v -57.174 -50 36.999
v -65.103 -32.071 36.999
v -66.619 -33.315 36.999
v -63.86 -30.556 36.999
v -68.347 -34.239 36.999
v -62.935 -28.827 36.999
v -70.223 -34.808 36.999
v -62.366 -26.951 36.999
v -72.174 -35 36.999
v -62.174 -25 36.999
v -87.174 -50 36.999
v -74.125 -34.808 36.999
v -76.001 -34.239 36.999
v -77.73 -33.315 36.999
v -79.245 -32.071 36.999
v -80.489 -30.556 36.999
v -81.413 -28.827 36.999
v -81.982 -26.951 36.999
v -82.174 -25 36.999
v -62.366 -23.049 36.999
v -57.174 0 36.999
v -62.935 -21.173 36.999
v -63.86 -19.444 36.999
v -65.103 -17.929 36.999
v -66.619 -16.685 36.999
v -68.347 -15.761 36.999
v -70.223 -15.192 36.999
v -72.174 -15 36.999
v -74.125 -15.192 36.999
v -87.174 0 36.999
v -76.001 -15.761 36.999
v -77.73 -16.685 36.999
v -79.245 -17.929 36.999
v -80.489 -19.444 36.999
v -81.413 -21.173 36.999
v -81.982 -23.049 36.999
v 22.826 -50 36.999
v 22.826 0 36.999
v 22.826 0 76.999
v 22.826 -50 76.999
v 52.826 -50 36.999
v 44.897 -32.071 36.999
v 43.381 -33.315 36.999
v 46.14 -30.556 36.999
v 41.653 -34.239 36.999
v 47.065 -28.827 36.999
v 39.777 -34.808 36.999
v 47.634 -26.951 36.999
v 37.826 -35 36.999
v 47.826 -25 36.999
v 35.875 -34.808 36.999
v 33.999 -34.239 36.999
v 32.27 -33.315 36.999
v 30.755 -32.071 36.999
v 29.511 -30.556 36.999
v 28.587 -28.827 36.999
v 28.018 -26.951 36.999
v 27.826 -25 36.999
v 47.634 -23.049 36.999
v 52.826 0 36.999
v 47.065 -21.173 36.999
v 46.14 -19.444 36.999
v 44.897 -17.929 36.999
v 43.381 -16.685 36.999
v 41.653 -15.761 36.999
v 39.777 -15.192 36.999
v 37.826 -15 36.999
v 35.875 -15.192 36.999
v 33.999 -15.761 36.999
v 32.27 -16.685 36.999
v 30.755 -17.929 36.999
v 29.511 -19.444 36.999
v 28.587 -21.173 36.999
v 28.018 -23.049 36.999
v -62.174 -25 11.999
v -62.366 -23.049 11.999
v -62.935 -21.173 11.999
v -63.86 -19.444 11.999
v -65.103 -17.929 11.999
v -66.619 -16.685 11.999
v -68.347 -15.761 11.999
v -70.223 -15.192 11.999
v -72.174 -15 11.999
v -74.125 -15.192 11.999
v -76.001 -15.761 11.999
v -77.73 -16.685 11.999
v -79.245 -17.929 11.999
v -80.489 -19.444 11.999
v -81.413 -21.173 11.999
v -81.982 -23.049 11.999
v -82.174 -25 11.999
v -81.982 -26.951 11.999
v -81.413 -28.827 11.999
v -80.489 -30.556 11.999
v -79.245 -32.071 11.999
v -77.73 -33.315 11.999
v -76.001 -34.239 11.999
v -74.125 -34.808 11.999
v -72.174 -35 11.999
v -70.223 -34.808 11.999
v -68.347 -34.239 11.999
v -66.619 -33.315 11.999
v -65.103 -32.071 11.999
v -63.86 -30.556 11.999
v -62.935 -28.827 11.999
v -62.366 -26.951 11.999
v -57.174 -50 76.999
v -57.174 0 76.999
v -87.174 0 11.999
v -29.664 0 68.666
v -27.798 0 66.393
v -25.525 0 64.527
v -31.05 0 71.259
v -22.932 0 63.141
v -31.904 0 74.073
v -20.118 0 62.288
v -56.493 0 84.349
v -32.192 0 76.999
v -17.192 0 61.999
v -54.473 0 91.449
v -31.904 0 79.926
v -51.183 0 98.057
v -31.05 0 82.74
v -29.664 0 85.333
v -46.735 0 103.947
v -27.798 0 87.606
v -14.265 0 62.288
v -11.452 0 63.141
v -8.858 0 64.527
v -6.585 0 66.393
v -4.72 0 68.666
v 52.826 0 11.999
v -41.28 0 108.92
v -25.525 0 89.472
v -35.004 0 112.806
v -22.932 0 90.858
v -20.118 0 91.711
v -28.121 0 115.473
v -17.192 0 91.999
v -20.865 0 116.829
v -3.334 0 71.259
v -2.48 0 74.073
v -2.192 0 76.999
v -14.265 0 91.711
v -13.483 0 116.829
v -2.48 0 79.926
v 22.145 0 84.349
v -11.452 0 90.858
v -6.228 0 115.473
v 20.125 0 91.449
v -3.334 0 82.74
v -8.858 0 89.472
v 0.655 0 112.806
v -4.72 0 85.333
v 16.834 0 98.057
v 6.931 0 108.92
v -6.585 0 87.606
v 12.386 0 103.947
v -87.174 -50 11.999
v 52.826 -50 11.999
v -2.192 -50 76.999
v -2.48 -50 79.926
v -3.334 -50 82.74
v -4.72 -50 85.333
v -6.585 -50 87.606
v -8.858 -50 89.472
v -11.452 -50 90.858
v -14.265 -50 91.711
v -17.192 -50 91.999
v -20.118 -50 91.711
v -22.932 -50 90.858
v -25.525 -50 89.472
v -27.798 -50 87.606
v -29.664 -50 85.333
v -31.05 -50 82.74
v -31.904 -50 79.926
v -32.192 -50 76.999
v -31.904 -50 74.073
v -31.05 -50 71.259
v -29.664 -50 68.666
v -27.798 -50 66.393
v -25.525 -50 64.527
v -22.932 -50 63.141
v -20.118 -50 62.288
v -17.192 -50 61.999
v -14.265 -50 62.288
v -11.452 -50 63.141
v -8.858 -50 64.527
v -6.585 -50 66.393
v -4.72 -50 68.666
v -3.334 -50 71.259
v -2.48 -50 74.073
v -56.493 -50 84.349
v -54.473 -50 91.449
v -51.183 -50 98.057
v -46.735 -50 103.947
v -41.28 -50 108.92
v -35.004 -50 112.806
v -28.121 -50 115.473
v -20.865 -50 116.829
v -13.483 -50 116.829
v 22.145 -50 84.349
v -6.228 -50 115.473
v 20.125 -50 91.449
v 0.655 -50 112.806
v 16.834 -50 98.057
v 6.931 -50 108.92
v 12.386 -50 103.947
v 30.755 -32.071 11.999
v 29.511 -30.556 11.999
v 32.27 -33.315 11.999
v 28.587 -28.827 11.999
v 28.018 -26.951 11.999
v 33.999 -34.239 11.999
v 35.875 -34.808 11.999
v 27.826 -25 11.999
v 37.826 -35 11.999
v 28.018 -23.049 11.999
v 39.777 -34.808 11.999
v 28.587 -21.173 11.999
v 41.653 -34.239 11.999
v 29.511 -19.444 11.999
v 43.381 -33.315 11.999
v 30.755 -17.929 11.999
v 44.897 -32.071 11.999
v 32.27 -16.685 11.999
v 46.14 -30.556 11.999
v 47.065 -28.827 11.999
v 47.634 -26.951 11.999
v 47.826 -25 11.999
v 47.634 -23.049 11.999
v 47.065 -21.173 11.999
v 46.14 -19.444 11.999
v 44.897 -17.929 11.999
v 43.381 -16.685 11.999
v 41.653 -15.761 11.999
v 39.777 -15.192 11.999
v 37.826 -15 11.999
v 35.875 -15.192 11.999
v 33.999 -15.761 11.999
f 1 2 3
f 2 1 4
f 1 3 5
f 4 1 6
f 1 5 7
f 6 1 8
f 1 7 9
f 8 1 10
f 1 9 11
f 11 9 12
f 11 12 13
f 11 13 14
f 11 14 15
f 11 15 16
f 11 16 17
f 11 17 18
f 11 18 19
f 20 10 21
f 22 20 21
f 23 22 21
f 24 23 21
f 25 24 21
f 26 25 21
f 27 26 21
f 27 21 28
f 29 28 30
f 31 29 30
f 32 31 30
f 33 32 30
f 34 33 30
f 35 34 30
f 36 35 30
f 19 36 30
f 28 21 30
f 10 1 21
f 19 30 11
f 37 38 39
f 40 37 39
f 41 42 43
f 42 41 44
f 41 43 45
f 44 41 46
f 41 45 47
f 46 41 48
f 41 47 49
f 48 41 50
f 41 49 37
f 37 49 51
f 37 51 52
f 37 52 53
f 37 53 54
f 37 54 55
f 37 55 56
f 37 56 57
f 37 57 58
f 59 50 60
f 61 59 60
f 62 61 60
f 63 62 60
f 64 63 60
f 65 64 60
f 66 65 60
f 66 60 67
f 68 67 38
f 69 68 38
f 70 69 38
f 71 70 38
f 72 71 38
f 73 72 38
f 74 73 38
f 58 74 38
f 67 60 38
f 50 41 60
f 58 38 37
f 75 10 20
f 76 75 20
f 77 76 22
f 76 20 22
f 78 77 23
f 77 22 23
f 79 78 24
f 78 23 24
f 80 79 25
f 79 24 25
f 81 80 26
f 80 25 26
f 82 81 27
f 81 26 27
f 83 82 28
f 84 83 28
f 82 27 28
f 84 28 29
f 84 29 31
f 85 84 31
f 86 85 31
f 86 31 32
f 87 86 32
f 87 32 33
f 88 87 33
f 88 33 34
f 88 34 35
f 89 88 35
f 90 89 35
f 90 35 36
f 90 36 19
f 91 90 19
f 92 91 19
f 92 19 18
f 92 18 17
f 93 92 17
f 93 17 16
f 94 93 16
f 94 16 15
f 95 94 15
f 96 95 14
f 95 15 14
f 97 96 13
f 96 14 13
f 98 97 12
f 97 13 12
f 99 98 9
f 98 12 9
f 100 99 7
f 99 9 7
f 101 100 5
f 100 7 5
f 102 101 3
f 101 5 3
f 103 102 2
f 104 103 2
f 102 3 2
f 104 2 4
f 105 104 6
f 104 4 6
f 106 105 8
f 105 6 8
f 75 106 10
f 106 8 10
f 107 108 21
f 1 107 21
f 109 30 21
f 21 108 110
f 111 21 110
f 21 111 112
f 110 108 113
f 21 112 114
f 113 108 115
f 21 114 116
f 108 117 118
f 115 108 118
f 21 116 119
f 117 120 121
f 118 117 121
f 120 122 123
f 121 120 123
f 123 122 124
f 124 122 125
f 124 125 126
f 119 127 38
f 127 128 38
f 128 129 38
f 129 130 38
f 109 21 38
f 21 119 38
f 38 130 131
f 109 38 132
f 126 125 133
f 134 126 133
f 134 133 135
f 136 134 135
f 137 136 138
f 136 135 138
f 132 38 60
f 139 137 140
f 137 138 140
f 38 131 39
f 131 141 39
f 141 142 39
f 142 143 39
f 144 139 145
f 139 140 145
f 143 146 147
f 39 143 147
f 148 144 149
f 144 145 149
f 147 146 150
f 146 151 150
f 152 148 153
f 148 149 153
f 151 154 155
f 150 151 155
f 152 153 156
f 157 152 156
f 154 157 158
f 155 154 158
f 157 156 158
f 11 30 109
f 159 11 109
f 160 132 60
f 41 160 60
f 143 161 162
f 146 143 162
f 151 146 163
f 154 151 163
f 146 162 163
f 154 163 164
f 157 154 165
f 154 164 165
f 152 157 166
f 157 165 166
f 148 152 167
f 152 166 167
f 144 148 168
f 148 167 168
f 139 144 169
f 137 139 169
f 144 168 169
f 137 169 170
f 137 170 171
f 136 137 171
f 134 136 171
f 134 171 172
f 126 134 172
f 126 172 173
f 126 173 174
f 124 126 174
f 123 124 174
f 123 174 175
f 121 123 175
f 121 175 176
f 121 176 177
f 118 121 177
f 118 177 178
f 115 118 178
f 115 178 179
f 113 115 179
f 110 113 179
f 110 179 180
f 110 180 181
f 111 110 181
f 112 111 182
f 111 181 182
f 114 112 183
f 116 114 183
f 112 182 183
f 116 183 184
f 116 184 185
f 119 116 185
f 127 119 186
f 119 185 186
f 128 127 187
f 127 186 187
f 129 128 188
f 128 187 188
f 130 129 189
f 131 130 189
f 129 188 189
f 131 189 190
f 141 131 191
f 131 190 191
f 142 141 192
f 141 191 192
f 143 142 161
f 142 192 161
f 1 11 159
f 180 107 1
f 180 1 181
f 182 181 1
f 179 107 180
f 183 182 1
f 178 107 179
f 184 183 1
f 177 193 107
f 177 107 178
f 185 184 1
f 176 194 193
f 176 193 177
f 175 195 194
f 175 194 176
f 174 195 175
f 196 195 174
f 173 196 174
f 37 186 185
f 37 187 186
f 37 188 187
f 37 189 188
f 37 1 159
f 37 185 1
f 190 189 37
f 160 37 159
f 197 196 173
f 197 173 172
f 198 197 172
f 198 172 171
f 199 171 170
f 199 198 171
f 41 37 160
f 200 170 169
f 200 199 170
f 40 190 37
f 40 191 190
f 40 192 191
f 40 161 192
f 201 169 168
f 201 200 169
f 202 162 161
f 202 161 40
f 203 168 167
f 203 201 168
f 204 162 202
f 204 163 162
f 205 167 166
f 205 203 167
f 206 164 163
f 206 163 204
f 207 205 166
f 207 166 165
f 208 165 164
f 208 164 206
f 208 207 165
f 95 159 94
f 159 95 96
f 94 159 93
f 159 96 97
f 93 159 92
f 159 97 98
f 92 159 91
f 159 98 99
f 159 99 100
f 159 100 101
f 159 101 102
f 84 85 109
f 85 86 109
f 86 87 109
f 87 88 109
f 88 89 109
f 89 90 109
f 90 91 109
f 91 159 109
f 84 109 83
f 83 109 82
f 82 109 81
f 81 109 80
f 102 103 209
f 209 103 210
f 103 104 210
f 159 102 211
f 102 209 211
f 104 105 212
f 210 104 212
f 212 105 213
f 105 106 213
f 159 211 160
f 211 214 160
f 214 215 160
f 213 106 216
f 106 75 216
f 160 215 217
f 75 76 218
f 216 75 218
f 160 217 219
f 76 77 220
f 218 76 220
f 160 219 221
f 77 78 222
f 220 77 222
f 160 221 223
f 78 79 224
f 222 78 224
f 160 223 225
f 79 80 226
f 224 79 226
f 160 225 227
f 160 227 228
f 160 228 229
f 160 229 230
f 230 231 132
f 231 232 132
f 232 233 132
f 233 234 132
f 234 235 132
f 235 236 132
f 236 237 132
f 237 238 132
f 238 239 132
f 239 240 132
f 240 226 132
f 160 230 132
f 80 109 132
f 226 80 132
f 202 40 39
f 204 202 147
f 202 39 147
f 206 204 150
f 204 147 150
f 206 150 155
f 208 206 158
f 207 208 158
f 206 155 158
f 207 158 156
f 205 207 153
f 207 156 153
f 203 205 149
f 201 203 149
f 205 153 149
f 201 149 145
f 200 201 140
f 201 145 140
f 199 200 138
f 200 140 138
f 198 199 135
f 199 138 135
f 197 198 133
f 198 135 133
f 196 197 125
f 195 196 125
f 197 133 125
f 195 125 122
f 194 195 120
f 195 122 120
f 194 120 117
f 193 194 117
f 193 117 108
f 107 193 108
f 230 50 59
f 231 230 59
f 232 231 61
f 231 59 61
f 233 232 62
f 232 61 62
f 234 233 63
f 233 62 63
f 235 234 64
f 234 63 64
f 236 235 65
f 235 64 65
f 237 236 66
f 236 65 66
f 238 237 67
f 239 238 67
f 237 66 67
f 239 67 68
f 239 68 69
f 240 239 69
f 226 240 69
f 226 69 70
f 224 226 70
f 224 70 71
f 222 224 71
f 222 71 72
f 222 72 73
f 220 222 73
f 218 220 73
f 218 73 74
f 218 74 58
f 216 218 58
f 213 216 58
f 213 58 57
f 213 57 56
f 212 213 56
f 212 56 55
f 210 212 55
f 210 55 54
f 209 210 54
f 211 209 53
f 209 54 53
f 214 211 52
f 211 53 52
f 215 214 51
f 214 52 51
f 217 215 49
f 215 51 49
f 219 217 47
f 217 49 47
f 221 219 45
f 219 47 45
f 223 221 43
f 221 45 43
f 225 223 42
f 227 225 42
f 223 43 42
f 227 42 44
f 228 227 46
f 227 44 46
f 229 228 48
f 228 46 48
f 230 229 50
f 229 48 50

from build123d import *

# Parameters (mm, degrees)
F1_DEPTH = 50
F2_R     = 15
F3_DEPTH = 51
F4_R     = 10
F5_DEPTH = 51


with BuildPart() as f1:
    # F0 (on Front) → F1 (new body)
    with BuildSketch(Plane.XZ):
        with BuildLine():
            Line((-57.174233, 36.999495), (-87.174233, 36.999495))
            Line((-87.174233, 36.999495), (-87.174233, 11.999495))
            Line((-87.174233, 11.999495), (52.825767, 11.999495))
            Line((52.825767, 11.999495), (52.825767, 36.999495))
            Line((52.825767, 36.999495), (22.825767, 36.999495))
            Line((22.825767, 36.999495), (22.825767, 76.999495))
            ThreePointArc((22.825767, 76.999495), (-17.174233, 116.999495), (-57.174233, 76.999495))
            Line((-57.174233, 76.999495), (-57.174233, 36.999495))
        make_face()
    extrude(amount=F1_DEPTH)

    # F2 (on face) → F3 (cut)
    with BuildSketch(Plane.XZ.offset(50)):
        with Locations((-17.19176, 76.999495)):
            Circle(F2_R)
    extrude(amount=-F3_DEPTH, mode=Mode.SUBTRACT)

    # F4 (on face) → F5 (cut)
    with BuildSketch(Plane.XY.offset(36.999495)):
        with Locations((-72.174233, -25)):
            Circle(F4_R)
        with Locations((37.825767, -25)):
            Circle(F4_R)
    extrude(amount=-F5_DEPTH, mode=Mode.SUBTRACT)


solid = f1.part
